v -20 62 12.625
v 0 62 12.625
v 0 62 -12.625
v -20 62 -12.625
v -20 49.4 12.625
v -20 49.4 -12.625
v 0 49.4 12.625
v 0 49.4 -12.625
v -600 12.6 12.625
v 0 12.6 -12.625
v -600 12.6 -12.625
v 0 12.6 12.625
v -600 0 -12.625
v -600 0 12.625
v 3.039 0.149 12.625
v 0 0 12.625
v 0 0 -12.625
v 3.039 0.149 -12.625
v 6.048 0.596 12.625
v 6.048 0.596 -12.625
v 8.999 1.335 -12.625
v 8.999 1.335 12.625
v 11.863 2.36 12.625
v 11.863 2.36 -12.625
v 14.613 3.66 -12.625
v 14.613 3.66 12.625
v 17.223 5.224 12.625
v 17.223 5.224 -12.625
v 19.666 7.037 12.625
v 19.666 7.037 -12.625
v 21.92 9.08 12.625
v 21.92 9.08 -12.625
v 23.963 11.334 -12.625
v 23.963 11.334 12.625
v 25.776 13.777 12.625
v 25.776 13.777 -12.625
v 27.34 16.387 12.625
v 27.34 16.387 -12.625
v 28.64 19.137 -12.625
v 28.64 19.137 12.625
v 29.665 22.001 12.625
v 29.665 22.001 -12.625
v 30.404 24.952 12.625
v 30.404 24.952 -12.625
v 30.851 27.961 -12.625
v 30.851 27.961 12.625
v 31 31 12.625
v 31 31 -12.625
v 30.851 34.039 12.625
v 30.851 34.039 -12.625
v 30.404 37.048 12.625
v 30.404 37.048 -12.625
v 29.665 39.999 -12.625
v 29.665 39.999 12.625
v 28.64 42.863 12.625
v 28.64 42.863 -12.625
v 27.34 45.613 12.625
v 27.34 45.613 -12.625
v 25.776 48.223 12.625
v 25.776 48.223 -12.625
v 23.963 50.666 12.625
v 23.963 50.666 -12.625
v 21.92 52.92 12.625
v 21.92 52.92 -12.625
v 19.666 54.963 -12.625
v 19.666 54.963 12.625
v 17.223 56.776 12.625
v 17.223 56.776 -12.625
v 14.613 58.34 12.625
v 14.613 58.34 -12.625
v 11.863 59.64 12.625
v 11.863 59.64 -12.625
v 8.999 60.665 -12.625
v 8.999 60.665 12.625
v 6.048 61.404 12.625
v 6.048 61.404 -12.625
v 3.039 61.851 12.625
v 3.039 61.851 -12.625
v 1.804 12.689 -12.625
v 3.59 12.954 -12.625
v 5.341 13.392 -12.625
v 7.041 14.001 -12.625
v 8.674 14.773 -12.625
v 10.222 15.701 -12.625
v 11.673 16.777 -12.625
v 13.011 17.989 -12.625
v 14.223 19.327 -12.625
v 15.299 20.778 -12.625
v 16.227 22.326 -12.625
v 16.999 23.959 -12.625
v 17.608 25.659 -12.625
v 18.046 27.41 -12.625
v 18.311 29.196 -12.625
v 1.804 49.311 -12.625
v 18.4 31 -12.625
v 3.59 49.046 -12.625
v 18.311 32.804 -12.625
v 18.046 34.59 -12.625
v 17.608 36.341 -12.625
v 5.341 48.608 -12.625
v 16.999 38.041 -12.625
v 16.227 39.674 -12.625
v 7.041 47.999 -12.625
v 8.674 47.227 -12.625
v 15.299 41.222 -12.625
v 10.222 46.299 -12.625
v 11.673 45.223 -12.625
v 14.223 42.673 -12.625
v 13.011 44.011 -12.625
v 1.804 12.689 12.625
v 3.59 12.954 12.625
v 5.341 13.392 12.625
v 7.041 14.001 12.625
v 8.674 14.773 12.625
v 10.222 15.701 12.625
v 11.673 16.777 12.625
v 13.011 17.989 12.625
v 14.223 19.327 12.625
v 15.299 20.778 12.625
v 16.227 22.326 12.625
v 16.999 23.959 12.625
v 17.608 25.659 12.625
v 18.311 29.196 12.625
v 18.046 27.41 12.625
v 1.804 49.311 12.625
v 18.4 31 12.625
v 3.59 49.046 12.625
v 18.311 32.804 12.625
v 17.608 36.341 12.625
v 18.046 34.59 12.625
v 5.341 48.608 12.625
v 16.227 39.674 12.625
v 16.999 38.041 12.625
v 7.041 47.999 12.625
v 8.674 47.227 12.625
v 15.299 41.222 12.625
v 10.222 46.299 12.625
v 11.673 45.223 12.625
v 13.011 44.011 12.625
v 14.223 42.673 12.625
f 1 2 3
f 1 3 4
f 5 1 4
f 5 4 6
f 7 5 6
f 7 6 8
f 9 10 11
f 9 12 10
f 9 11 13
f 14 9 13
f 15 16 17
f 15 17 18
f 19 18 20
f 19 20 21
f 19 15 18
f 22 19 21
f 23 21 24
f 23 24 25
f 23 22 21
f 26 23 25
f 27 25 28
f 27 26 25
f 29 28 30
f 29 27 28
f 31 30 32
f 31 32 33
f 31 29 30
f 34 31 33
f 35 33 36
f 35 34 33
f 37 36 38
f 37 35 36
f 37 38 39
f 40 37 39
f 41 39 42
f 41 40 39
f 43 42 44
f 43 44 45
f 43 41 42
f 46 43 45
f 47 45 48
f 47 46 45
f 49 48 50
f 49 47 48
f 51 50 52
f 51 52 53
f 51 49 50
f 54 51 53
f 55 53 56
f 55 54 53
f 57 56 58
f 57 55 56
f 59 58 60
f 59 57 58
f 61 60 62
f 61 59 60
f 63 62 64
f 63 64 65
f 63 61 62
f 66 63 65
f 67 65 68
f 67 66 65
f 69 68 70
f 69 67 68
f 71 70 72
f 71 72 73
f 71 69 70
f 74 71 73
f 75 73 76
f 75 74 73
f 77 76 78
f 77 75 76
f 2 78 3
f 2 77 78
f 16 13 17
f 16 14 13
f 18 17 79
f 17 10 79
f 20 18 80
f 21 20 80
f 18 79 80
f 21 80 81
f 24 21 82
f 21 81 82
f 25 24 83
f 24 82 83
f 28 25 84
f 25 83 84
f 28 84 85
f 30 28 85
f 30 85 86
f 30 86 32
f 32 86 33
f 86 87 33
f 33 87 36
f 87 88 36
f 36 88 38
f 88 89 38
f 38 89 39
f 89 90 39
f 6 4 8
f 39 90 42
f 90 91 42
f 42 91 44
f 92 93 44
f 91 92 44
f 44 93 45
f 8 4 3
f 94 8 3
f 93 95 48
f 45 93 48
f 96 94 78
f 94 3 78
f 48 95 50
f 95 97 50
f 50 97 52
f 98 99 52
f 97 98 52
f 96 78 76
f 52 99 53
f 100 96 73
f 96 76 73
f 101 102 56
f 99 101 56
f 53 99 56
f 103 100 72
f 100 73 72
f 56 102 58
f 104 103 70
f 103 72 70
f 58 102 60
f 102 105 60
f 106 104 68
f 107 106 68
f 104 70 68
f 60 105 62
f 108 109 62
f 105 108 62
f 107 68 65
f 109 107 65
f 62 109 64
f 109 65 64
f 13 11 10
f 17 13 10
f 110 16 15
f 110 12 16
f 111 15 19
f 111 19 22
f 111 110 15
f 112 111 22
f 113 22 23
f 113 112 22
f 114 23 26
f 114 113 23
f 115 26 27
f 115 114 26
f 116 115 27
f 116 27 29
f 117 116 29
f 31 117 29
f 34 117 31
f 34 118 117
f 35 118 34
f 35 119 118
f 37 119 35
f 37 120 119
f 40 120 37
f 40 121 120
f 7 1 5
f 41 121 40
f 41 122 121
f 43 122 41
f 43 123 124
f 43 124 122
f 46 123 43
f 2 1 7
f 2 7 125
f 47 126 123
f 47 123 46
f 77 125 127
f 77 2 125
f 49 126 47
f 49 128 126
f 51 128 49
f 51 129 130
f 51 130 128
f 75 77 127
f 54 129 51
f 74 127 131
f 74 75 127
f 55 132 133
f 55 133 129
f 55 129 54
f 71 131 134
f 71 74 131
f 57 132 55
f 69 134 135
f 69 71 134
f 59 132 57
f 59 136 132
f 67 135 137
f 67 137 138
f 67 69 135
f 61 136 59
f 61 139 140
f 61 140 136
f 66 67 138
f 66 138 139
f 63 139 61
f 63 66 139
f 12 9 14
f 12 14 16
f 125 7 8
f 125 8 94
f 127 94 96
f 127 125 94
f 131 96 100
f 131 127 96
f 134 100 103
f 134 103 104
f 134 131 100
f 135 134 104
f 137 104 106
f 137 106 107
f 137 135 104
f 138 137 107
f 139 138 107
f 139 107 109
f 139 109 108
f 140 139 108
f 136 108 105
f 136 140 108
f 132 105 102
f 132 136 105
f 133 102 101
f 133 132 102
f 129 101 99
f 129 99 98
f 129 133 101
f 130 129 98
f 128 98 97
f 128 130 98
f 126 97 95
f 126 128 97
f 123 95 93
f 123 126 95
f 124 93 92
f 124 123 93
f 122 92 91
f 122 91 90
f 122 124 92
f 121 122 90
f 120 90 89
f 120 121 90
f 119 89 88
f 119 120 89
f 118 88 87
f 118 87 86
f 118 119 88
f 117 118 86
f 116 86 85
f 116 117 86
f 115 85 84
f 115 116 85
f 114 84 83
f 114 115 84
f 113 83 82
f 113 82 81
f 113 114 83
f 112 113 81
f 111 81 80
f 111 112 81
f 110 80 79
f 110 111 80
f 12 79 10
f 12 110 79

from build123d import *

# Parameters (mm, degrees)
BOSS_EXTRUDE1_DEPTH = 12.625


with BuildPart() as part:
    # Sketch1 → Boss-Extrude1 (new, symmetric)
    with BuildSketch(Plane.XY):
        with BuildLine():
            Line((-600, 0), (0, 0))
            ThreePointArc((0, 0), (31, 31), (0, 62))
            Line((0, 62), (-20, 62))
            Line((-20, 62), (-20, 49.4))
            Line((-20, 49.4), (0, 49.4))
            ThreePointArc((0, 49.4), (18.4, 31), (0, 12.6))
            Line((0, 12.6), (-600, 12.6))
            Line((-600, 12.6), (-600, 0))
        make_face()
    extrude(amount=BOSS_EXTRUDE1_DEPTH, both=True)


solid = part.part
